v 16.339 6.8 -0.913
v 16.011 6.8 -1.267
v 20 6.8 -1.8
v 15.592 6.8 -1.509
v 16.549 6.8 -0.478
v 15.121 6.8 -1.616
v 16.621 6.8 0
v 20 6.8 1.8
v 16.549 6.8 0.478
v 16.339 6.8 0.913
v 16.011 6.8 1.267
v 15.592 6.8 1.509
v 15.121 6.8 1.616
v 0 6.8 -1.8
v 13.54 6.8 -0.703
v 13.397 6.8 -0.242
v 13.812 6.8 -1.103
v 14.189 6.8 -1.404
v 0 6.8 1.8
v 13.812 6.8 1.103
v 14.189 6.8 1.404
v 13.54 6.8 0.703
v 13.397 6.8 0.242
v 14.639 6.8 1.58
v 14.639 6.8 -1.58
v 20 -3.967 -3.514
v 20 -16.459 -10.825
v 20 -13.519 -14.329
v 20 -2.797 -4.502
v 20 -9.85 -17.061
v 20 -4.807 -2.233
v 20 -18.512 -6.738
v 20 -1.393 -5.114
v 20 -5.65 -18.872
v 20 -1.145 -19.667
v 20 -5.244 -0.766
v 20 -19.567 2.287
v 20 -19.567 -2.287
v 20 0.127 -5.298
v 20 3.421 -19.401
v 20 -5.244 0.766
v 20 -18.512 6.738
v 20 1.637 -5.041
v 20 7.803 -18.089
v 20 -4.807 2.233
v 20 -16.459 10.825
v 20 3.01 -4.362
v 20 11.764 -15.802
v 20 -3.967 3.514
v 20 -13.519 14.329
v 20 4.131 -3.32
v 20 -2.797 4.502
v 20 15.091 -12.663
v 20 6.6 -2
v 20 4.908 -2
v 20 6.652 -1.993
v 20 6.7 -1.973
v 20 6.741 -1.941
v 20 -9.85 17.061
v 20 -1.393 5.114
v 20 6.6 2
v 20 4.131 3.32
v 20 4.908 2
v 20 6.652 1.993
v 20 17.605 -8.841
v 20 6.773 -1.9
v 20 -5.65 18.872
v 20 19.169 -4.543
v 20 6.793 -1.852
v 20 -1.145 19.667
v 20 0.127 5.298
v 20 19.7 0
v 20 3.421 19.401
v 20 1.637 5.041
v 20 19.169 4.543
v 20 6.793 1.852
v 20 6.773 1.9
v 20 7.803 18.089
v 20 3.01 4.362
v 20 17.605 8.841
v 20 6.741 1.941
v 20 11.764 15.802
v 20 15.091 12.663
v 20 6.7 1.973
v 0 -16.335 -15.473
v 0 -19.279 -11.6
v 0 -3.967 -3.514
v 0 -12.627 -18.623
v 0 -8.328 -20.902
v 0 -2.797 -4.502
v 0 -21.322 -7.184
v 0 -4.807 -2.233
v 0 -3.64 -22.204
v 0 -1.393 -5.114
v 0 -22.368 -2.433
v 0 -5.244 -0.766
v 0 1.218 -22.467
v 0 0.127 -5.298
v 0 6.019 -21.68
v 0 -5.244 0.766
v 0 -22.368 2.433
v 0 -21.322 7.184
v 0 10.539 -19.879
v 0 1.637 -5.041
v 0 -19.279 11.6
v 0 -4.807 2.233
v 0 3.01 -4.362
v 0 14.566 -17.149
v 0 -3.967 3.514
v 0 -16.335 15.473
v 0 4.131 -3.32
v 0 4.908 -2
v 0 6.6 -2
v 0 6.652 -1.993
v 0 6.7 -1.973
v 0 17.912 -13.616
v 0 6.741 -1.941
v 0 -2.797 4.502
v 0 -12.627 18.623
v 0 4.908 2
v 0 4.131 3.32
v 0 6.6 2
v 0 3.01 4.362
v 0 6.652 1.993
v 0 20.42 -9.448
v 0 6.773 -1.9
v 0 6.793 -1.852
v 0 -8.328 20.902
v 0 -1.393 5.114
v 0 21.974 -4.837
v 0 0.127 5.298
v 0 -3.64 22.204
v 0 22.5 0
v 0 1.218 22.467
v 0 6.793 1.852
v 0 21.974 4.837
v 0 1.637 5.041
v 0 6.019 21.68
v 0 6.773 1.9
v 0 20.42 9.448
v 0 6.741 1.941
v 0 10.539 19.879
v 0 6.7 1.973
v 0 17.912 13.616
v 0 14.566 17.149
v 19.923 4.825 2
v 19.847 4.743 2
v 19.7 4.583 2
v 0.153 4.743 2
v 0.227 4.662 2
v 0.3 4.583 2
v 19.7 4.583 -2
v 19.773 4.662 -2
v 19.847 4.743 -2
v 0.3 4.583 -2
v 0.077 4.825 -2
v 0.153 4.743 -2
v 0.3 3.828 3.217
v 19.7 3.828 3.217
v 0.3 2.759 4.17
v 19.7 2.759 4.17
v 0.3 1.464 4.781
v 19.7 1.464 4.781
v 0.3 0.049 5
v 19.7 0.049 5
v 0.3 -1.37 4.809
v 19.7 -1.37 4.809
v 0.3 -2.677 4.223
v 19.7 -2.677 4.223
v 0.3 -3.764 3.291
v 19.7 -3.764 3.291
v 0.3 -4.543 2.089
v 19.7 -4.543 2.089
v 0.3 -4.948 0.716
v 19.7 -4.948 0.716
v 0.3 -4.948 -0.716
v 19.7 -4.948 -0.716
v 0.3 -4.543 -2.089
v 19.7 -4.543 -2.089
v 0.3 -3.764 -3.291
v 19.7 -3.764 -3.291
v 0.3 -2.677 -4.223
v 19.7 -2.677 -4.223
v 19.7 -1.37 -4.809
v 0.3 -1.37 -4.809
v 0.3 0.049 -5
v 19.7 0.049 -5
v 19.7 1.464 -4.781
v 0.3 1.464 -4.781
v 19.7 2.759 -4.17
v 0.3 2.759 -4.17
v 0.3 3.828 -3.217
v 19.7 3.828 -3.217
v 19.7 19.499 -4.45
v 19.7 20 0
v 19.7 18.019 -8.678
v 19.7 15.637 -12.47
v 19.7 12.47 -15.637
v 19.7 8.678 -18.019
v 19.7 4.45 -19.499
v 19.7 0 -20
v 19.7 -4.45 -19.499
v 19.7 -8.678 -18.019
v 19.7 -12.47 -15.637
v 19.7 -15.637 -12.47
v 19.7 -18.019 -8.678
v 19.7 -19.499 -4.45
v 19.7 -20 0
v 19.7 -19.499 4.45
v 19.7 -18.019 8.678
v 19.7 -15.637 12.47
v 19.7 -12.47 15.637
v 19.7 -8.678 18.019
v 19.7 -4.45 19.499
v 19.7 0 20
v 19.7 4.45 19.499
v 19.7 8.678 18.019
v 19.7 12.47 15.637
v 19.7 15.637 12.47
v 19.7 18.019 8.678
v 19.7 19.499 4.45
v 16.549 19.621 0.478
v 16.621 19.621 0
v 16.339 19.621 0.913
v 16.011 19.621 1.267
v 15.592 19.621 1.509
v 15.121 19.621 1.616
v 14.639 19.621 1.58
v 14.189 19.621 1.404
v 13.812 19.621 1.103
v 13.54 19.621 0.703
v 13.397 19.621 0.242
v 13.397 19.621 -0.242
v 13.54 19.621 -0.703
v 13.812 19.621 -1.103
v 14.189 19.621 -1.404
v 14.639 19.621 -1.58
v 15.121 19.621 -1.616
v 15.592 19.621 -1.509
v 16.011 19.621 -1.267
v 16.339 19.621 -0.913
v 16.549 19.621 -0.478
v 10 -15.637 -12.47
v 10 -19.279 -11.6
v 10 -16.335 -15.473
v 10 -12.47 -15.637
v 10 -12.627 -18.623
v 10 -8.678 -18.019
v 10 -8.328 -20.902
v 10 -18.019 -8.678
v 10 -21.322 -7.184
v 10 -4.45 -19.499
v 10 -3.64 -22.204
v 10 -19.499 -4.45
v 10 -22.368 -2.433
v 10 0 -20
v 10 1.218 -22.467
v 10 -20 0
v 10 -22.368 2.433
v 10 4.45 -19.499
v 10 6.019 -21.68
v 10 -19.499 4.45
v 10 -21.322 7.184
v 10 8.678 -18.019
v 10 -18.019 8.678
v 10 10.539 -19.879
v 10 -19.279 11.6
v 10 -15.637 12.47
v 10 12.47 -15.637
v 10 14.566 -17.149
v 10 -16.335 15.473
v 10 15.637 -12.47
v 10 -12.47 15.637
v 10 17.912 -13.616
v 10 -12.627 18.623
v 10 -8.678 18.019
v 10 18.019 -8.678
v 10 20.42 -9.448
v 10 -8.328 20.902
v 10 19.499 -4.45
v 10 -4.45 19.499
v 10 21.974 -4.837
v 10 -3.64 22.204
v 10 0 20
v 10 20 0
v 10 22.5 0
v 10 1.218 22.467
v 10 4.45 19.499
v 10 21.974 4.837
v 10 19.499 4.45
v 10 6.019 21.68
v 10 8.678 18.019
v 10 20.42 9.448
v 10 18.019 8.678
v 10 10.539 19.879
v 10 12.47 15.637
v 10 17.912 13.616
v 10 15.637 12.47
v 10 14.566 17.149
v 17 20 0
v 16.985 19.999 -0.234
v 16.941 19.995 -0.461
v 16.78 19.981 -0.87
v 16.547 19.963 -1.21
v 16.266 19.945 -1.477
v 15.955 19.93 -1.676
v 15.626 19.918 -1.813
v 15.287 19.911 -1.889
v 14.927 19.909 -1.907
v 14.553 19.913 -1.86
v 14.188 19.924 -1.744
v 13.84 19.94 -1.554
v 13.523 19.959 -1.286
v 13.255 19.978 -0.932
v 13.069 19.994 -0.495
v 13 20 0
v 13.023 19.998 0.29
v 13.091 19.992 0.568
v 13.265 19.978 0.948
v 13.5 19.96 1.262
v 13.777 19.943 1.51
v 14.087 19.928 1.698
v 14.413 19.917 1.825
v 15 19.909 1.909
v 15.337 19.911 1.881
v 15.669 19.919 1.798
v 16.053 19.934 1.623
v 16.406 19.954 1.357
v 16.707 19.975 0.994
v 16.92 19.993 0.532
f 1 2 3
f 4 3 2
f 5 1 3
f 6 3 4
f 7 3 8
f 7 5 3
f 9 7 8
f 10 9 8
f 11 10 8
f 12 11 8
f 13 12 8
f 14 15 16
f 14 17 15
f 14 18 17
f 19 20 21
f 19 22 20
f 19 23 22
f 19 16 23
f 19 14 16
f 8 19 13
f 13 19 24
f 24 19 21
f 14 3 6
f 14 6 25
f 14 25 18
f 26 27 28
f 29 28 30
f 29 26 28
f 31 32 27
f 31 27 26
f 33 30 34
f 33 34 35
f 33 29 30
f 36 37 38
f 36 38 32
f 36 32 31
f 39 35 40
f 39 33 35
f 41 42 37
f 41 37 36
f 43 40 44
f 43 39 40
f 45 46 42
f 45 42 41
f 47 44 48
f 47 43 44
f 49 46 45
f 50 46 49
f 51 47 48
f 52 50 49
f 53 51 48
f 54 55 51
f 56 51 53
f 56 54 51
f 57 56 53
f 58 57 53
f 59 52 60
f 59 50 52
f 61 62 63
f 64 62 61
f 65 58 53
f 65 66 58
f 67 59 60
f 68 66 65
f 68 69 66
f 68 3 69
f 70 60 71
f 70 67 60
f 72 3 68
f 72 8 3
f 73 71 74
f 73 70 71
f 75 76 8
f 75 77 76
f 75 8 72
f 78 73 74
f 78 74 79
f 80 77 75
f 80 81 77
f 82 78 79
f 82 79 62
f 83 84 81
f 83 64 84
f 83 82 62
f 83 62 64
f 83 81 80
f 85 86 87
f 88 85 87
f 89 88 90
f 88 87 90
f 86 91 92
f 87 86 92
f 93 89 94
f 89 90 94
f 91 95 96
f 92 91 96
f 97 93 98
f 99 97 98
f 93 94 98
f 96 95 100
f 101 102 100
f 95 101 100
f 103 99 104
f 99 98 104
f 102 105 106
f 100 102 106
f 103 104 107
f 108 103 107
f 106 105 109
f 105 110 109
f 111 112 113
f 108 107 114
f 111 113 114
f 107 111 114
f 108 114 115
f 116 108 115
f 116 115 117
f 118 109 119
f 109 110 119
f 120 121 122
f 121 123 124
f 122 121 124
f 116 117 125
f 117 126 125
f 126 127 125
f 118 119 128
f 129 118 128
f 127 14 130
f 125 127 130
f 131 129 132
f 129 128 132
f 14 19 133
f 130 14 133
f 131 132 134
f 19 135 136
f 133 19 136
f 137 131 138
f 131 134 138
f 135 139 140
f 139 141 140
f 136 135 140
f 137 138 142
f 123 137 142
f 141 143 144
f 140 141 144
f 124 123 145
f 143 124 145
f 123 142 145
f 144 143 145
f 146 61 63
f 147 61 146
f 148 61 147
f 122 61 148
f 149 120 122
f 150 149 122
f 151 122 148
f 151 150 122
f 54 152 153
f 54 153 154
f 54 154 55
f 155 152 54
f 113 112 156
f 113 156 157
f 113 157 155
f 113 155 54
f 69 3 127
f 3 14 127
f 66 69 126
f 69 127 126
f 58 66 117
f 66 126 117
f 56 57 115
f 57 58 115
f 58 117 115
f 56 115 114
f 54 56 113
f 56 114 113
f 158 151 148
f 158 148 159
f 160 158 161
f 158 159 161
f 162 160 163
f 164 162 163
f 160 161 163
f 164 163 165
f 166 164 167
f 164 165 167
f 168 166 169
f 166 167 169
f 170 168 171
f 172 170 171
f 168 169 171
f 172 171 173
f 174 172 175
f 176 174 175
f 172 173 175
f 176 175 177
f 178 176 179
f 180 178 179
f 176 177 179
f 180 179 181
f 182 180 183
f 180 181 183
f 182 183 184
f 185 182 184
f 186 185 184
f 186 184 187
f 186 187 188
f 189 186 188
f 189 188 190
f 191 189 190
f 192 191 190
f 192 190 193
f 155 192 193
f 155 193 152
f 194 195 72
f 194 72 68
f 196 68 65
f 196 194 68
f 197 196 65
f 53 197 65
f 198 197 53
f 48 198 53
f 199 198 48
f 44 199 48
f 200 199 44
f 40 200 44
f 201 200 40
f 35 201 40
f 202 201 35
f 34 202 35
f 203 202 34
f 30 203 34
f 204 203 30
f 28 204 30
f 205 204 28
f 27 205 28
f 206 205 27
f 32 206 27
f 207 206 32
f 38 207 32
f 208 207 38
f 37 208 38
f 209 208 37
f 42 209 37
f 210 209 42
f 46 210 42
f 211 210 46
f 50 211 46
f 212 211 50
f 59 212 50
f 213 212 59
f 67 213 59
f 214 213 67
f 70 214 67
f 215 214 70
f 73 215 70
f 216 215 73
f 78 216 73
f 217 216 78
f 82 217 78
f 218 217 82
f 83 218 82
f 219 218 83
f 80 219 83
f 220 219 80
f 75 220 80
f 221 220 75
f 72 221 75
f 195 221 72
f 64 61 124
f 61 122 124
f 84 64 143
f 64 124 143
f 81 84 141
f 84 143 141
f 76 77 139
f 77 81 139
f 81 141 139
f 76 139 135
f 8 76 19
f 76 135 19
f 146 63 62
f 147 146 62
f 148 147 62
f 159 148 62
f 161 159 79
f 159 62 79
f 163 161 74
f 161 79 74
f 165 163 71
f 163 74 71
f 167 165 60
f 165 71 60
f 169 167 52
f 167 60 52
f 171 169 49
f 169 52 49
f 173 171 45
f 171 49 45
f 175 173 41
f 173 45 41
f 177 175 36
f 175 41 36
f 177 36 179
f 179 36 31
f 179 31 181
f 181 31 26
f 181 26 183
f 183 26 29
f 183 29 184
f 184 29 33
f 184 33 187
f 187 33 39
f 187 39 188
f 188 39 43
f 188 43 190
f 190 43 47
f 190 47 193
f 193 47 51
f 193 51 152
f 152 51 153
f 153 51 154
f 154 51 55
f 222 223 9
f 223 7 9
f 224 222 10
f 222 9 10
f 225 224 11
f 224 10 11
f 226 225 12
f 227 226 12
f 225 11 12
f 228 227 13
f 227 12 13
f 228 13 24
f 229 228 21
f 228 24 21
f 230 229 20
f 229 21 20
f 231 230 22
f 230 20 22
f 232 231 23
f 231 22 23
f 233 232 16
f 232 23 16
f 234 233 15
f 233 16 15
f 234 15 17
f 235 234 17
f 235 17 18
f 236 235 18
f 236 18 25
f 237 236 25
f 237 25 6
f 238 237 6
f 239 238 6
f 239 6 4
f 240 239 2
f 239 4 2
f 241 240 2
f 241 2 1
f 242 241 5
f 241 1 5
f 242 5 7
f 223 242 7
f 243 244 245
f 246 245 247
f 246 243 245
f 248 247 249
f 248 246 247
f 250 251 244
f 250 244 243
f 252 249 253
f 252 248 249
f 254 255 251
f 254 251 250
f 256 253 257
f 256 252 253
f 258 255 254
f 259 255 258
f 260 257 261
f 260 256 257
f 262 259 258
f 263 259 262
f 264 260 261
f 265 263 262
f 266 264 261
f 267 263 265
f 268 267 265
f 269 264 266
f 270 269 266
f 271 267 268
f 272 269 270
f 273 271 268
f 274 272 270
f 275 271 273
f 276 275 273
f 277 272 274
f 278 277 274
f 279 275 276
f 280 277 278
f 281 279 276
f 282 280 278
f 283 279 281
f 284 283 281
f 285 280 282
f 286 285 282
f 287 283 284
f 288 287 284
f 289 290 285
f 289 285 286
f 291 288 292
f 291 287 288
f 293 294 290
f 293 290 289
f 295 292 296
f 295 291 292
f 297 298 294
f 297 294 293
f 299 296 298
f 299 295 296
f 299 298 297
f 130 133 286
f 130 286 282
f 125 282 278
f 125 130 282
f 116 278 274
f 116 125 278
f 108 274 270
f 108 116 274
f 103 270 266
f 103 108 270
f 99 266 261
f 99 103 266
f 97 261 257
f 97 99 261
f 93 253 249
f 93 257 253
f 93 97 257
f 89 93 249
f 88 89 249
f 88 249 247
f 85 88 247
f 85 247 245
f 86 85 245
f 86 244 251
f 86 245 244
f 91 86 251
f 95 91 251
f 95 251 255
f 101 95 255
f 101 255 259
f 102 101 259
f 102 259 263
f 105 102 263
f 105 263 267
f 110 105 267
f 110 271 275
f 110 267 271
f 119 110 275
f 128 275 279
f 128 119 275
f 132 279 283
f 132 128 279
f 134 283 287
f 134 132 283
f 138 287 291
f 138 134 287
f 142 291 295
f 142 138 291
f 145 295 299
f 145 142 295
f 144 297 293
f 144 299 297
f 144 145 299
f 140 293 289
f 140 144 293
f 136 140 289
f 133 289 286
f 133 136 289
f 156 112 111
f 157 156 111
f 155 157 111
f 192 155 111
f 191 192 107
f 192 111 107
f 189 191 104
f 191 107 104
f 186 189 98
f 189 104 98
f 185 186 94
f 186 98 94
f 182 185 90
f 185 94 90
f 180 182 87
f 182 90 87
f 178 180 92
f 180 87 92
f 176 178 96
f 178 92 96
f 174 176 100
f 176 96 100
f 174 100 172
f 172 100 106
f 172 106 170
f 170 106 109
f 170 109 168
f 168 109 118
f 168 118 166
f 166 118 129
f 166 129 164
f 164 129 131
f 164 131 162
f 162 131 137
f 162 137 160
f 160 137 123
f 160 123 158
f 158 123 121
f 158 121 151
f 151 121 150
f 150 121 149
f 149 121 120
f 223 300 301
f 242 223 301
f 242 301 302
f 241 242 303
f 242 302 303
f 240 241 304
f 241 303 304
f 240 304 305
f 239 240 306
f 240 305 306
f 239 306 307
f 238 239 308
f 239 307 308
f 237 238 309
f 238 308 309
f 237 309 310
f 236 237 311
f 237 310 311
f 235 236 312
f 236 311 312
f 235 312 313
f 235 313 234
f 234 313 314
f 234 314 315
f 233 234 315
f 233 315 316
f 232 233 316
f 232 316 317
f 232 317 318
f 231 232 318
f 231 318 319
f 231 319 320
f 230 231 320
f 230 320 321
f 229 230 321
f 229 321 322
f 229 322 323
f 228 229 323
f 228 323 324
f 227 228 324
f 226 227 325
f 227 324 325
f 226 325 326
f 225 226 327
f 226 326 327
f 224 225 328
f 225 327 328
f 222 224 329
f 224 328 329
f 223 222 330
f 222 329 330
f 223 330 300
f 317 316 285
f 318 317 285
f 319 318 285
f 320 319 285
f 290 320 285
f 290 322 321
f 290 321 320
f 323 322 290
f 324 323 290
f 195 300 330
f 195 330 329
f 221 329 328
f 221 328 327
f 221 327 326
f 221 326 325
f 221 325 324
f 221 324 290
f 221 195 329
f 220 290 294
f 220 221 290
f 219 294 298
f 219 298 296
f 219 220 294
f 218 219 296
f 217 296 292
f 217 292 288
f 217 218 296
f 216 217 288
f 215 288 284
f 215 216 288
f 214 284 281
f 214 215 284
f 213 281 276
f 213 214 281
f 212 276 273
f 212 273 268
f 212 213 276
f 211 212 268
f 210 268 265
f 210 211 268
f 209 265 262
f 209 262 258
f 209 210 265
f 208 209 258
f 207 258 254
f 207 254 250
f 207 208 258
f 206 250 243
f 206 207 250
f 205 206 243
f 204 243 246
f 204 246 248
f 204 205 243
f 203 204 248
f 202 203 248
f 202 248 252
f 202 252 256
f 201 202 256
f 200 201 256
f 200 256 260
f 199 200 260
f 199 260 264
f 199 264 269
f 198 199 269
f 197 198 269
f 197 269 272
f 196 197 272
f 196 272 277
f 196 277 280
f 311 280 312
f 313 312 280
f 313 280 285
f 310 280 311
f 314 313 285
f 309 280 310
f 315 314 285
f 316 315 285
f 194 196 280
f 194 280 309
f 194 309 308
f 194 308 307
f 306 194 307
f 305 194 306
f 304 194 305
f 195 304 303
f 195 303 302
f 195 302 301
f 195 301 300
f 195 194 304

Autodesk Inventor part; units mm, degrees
sketch "Sketch_11" plane through (0, 0, 0) normal (0, 0, 1) x (1, 0, 0)
  line L0 (20, 0) -> (0, 0)
  line L1 (0, 0) -> (0, 34)
  line L2 (0, 34) -> (0.5359, 36)
  line L3 (0.5359, 36) -> (9.4641, 36)
  line L4 (9.4641, 36) -> (10, 34)
  line L5 (10, 34) -> (10, 20)
  line L6 (10, 20) -> (19.7, 20)
  line L7 (19.7, 20) -> (20, 19.7)
  line L8 (20, 19.7) -> (20, 0)
  line L9 (20, 0) -> (0, 0)
revolve "Revolution1" add sketch "Sketch_11" angle 360 about axis through (20, 0, 0) along (1, 0, 0)
sketch "Sketch_2" plane through (0, 0, 0) normal (1, 0, 0) x (0, 1, 0)
  circle A0 centre (0, 0) radius 41
  circle A1 centre (0, 0) radius 22.5
extrude "Extrusion1" cut sketch "Sketch_2" along normal blind 10
sketch "_____1" plane through (0, 0, 0) normal (0, 0, 1) x (1, 0, 0)
  line L0 (40, 0) -> (-40, 0)
  line L1 (0, 0) -> (0, 5.3)
  line L2 (0, 5.3) -> (0.3, 5)
  line L3 (0.3, 5) -> (19.7, 5)
  line L4 (19.7, 5) -> (20, 5.3)
  line L5 (20, 5.3) -> (20, 0)
  line L6 (20, 0) -> (0, 0)
revolve "Revolution2" cut sketch "_____1" angle 360 about axis through (40, 0, 0) along (1, 0, 0)
sketch "Sketch_3" plane through (0, 0, 0) normal (0, 0, 1) x (1, 0, 0)
  line L0 (15, 0) -> (15, 21)
  line L1 (15, 21) -> (17, 21)
  line L2 (17, 21) -> (17, 20)
  line L3 (17, 20) -> (16.621, 19.621)
  line L4 (16.621, 19.621) -> (16.621, 0)
  line L5 (16.621, 0) -> (15, 0)
  line L6 (15, 0) -> (15, 21)
revolve "Revolution3" cut sketch "Sketch_3" angle 360 about axis through (15, 0, 0) along (0, -1, 0)
thread "Thread1" size "M4x0.7" class "6H" standard "ISO Metric profile" full length
sketch "Sketch_5" plane through (0, 0, 0) normal (1, 0, 0) x (0, 1, 0)
  line L0 (6.6, 2) -> (0, 2)
  line L1 (0, 2) -> (0, -2)
  line L2 (0, -2) -> (6.6, -2)
  arc A0 (6.6, -2) -> (6.8, -1.8) centre (6.6, -1.8) ccw
  line L3 (6.8, -1.8) -> (6.8, 1.8)
  arc A1 (6.8, 1.8) -> (6.6, 2) centre (6.6, 1.8) ccw
extrude "Extrusion2" cut sketch "Sketch_5" along normal blind 20
ref_plane "body_to_teeth_XY" through (0, 0, 0) normal (1, 0, 0) x (0, 0, -1)
ref_plane "body_to_teeth_YZ" through (0, 0, 0) normal (0, 0, -1) x (0, 1, 0)
ref_plane "body_to_teeth_ZX" through (0, 0, 0) normal (0, 1, 0) x (1, 0, 0)
ref_plane "screw1_XY" through (15, 20, 0) normal (0, -1, 0) x (1, 0, 0)
ref_plane "screw1_YZ" through (15, 20, 0) normal (1, 0, 0) x (0, 0, 1)
ref_plane "screw1_ZX" through (15, 20, 0) normal (0, 0, 1) x (0, -1, 0)
ref_plane "screw2_XY" through (15, 0, -20) normal (0, 0, -1) x (1, 0, 0)
ref_plane "screw2_YZ" through (15, 0, -20) normal (1, 0, 0) x (0, -1, 0)
ref_plane "screw2_ZX" through (15, 0, -20) normal (0, -1, 0) x (0, 0, -1)
ref_plane "screw3_XY" through (15, -10, -17.3205) normal (0, -0.5, -0.866) x (1, 0, 0)
ref_plane "screw3_YZ" through (15, -10, -17.3205) normal (1, 0, 0) x (0, -0.866, 0.5)
ref_plane "screw3_ZX" through (15, -10, -17.3205) normal (0, -0.866, 0.5) x (0, -0.5, -0.866)
properties part number "GEYK1.0-70-10-B-10K.0_b"
